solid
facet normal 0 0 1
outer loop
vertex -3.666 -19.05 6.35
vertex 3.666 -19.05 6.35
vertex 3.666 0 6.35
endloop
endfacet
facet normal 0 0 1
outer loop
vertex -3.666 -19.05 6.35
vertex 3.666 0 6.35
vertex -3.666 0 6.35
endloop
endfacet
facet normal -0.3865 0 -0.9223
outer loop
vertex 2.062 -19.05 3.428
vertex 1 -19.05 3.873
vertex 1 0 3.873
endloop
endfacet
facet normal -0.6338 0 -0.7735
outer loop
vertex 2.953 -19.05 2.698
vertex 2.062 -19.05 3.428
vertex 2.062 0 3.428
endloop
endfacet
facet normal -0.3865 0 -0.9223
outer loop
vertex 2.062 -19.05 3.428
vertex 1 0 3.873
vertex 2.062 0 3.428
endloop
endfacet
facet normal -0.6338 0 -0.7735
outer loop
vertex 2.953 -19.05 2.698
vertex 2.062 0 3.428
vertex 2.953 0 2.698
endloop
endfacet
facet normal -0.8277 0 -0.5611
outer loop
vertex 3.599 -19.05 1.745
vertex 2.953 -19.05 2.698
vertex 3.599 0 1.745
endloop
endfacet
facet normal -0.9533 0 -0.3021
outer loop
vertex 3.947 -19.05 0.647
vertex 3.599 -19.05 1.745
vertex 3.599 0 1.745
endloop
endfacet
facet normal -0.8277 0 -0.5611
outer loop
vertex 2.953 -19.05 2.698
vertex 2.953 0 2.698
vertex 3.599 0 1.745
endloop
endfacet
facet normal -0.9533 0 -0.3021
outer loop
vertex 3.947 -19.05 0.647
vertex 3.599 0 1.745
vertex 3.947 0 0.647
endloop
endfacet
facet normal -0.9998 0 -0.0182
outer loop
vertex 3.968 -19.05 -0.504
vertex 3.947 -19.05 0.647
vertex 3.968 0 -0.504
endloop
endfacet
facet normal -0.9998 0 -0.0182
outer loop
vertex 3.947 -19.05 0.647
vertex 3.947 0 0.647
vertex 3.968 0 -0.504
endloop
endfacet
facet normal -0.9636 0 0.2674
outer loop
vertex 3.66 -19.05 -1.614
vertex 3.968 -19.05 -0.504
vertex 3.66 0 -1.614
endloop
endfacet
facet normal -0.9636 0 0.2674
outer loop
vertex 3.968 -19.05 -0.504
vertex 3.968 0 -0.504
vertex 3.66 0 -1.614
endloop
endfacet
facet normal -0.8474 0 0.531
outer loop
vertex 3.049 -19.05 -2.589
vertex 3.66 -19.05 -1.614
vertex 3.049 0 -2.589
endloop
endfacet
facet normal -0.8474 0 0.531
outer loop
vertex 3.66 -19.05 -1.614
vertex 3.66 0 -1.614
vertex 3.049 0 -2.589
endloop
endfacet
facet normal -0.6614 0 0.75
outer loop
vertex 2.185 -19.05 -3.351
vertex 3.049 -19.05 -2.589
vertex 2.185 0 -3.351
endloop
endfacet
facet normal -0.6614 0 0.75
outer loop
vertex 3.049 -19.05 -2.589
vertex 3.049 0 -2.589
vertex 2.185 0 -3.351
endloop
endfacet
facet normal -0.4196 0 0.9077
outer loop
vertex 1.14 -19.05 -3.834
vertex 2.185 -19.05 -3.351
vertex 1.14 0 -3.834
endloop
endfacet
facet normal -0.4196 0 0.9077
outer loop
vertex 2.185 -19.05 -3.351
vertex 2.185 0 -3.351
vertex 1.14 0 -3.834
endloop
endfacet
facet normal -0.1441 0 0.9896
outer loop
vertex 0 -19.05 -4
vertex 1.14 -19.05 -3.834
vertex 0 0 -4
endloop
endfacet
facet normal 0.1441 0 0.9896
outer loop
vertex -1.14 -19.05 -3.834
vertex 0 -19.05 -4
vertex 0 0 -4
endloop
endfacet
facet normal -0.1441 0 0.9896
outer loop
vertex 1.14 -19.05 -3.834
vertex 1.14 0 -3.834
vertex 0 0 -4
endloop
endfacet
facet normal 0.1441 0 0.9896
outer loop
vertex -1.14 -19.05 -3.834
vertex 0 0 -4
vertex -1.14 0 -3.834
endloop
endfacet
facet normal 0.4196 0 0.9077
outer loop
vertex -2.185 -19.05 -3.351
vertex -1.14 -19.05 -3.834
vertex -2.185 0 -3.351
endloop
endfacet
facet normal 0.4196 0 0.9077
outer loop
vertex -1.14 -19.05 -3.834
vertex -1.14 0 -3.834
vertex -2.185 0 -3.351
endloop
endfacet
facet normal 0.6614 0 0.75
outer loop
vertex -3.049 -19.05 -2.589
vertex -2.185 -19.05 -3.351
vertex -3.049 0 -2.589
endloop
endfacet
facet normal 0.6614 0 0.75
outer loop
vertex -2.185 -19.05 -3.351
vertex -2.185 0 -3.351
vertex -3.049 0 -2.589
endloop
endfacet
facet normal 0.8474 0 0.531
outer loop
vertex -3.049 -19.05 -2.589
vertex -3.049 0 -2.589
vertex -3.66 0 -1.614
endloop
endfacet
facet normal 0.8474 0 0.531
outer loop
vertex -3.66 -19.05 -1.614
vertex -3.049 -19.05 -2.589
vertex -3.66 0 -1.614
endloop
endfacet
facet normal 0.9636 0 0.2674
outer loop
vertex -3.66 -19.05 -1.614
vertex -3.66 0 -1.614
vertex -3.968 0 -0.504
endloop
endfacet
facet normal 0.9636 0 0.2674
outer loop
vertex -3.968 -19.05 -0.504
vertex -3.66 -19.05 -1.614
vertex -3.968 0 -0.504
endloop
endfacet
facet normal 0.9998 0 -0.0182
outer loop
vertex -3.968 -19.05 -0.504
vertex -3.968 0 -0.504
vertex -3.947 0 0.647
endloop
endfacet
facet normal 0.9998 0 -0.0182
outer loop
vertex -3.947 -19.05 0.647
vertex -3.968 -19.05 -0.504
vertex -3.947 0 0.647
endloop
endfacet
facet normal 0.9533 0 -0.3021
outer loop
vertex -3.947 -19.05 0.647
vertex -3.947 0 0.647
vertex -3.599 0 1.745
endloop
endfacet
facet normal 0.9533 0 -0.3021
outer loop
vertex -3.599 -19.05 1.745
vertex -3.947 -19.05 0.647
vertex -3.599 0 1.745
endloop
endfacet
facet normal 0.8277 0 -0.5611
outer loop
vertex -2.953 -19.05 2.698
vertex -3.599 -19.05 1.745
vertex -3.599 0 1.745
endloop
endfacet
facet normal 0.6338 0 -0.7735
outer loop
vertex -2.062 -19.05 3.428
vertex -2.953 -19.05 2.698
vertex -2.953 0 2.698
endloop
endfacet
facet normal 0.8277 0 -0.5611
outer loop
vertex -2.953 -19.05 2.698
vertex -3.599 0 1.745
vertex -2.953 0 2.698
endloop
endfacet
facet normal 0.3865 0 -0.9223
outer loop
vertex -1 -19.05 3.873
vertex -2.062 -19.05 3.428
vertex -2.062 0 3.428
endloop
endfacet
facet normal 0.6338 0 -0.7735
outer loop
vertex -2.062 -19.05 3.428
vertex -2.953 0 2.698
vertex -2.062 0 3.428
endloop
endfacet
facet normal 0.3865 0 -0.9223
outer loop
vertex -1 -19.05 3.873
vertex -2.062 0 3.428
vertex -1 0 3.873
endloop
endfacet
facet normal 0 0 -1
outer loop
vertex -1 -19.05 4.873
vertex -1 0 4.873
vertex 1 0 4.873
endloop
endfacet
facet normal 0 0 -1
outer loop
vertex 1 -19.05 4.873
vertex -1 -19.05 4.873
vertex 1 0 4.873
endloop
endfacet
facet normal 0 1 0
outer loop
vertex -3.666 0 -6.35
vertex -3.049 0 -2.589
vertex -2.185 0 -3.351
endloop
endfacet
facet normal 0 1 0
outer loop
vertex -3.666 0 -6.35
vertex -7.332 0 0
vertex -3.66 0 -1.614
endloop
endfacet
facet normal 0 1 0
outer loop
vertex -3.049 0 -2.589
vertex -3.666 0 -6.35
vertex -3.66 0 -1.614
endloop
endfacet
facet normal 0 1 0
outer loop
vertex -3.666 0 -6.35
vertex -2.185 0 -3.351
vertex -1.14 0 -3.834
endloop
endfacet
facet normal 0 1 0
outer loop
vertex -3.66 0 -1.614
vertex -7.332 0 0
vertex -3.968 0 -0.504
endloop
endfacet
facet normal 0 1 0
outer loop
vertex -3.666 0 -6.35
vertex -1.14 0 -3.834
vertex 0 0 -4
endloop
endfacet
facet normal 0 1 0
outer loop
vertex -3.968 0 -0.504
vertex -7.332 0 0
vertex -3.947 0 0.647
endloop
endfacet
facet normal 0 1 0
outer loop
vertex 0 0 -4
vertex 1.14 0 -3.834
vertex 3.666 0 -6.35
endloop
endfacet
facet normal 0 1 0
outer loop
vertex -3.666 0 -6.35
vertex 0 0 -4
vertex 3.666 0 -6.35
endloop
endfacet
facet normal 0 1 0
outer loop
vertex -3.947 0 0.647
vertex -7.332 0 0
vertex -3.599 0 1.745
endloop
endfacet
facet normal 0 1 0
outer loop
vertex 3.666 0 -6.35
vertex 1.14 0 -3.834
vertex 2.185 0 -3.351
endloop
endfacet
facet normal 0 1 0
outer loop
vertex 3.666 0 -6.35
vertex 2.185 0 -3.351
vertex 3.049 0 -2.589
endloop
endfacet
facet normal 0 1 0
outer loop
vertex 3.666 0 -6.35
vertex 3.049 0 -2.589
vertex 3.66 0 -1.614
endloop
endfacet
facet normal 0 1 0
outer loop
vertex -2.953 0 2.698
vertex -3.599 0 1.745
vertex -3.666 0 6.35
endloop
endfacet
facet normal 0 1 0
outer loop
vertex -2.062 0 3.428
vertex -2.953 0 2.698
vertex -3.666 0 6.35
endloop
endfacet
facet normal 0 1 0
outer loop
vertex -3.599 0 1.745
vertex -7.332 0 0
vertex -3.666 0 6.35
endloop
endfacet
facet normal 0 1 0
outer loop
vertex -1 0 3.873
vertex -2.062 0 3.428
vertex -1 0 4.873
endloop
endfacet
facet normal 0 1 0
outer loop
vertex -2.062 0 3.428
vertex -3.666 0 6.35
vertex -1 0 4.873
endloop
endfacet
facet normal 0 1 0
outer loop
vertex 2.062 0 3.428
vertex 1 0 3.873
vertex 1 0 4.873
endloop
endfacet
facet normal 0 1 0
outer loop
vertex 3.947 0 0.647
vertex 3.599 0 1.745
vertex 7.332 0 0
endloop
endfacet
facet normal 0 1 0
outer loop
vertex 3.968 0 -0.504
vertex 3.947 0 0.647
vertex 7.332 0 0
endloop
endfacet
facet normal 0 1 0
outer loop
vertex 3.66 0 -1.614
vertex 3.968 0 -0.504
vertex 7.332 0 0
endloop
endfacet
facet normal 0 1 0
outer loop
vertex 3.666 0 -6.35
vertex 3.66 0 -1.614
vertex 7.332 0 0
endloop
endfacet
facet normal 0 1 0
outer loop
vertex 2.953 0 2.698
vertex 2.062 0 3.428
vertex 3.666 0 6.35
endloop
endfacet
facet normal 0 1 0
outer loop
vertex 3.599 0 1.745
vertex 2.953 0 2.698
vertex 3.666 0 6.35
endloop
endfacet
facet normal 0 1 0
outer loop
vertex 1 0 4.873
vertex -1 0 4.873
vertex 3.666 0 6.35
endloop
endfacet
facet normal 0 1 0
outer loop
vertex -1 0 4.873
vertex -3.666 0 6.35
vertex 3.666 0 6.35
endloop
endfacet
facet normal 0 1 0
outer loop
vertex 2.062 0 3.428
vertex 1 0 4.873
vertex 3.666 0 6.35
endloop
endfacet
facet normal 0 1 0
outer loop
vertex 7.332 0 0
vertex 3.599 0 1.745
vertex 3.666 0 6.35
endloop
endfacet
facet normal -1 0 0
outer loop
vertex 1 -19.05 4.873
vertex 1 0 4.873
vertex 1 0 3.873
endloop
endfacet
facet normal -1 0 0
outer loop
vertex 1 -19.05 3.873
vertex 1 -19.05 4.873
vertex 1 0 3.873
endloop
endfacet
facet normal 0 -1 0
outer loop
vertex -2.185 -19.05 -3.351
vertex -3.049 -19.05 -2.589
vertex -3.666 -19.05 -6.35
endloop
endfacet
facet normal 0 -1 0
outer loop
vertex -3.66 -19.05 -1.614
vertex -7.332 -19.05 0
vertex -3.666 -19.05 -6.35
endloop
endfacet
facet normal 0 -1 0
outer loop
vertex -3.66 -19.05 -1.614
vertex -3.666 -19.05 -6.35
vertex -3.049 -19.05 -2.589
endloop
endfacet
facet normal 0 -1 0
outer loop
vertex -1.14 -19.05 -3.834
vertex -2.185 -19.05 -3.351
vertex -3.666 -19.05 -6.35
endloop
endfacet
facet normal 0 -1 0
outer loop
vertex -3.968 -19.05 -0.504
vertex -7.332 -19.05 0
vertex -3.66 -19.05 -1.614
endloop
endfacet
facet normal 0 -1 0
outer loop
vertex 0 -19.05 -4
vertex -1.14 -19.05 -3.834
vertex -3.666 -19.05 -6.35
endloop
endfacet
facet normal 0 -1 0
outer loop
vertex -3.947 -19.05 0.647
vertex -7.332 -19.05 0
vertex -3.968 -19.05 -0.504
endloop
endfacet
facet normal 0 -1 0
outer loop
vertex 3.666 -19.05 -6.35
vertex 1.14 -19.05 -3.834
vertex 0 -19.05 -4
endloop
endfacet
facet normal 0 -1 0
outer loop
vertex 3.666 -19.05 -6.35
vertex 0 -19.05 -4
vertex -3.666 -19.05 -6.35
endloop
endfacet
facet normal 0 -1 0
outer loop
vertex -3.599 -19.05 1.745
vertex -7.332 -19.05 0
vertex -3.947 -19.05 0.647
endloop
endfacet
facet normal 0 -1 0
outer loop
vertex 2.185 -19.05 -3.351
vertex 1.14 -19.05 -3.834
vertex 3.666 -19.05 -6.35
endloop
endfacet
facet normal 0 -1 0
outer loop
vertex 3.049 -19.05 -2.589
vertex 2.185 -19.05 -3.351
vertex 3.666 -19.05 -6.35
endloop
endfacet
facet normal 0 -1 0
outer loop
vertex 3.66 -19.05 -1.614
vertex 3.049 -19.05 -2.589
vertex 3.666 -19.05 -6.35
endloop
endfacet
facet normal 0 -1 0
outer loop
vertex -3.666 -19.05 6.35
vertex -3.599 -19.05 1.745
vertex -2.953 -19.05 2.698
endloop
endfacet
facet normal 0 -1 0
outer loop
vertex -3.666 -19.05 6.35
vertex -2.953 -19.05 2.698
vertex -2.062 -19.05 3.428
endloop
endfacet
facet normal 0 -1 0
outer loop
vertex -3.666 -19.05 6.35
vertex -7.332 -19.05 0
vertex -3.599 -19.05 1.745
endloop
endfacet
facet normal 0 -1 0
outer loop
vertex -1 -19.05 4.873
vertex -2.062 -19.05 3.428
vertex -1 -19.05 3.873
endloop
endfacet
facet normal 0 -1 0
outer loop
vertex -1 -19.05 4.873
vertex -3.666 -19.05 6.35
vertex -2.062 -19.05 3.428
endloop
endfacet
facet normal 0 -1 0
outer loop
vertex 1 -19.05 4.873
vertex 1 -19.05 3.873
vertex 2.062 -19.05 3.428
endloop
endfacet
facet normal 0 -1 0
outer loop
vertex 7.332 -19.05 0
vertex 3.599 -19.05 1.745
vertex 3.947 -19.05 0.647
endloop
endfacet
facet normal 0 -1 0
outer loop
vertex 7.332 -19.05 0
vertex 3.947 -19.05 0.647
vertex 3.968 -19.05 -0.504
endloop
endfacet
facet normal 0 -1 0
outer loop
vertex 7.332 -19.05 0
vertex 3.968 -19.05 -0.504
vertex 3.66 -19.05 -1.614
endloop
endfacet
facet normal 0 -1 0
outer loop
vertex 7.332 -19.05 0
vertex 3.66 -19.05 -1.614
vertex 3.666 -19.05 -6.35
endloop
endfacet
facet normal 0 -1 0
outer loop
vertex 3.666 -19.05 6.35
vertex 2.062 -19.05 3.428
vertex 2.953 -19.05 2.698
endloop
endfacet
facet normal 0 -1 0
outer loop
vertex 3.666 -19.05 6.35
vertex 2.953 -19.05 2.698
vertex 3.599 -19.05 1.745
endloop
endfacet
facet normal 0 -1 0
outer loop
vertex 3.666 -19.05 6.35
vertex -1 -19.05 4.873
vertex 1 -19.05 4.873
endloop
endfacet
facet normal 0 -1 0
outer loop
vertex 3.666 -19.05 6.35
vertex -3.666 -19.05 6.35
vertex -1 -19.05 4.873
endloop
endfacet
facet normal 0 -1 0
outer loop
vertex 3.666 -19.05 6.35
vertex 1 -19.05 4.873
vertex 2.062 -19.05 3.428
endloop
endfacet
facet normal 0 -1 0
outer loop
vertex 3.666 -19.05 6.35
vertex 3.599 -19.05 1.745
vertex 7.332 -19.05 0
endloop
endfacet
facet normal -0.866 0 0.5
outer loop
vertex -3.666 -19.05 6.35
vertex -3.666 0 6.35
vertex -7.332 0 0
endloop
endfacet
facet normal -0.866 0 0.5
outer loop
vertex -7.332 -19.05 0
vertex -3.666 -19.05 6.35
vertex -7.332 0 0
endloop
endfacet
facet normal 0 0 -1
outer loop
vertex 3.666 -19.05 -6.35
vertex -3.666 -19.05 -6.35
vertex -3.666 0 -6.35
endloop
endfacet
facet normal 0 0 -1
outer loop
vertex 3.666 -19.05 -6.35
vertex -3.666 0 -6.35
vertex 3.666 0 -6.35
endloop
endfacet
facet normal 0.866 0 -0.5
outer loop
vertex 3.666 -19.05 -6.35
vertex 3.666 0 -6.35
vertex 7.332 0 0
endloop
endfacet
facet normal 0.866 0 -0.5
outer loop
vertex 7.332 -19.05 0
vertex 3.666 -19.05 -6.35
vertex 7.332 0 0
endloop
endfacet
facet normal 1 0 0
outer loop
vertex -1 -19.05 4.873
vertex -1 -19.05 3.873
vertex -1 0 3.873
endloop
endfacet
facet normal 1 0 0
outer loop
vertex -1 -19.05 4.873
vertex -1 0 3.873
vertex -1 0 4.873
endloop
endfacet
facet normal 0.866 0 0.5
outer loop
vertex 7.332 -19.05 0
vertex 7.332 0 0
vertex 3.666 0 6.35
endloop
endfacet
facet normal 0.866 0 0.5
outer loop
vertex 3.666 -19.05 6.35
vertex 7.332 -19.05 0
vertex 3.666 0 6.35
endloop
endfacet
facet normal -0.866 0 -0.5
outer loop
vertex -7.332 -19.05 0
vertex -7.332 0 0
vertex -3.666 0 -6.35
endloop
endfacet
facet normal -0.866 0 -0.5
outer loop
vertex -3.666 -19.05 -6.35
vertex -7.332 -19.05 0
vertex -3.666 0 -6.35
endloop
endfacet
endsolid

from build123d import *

# Parameters (mm, degrees)
F1_DEPTH = 19.05


with BuildPart() as f1:
    # F0 (on Front) → F1 (new body)
    with BuildSketch(Plane.XZ):
        Polygon((3.666174, 6.35), (-3.666174, 6.35), (-7.332348, 0), (-3.666174, -6.35), (3.666174, -6.35), (7.332348, 0), align=None)
        with BuildLine():
            ThreePointArc((1, 3.872983), (0, -4), (-1, 3.872983))
            Line((-1, 3.872983), (-1, 4.872983))
            Line((-1, 4.872983), (1, 4.872983))
            Line((1, 4.872983), (1, 3.872983))
        make_face(mode=Mode.SUBTRACT)
    extrude(amount=F1_DEPTH)


solid = f1.part
